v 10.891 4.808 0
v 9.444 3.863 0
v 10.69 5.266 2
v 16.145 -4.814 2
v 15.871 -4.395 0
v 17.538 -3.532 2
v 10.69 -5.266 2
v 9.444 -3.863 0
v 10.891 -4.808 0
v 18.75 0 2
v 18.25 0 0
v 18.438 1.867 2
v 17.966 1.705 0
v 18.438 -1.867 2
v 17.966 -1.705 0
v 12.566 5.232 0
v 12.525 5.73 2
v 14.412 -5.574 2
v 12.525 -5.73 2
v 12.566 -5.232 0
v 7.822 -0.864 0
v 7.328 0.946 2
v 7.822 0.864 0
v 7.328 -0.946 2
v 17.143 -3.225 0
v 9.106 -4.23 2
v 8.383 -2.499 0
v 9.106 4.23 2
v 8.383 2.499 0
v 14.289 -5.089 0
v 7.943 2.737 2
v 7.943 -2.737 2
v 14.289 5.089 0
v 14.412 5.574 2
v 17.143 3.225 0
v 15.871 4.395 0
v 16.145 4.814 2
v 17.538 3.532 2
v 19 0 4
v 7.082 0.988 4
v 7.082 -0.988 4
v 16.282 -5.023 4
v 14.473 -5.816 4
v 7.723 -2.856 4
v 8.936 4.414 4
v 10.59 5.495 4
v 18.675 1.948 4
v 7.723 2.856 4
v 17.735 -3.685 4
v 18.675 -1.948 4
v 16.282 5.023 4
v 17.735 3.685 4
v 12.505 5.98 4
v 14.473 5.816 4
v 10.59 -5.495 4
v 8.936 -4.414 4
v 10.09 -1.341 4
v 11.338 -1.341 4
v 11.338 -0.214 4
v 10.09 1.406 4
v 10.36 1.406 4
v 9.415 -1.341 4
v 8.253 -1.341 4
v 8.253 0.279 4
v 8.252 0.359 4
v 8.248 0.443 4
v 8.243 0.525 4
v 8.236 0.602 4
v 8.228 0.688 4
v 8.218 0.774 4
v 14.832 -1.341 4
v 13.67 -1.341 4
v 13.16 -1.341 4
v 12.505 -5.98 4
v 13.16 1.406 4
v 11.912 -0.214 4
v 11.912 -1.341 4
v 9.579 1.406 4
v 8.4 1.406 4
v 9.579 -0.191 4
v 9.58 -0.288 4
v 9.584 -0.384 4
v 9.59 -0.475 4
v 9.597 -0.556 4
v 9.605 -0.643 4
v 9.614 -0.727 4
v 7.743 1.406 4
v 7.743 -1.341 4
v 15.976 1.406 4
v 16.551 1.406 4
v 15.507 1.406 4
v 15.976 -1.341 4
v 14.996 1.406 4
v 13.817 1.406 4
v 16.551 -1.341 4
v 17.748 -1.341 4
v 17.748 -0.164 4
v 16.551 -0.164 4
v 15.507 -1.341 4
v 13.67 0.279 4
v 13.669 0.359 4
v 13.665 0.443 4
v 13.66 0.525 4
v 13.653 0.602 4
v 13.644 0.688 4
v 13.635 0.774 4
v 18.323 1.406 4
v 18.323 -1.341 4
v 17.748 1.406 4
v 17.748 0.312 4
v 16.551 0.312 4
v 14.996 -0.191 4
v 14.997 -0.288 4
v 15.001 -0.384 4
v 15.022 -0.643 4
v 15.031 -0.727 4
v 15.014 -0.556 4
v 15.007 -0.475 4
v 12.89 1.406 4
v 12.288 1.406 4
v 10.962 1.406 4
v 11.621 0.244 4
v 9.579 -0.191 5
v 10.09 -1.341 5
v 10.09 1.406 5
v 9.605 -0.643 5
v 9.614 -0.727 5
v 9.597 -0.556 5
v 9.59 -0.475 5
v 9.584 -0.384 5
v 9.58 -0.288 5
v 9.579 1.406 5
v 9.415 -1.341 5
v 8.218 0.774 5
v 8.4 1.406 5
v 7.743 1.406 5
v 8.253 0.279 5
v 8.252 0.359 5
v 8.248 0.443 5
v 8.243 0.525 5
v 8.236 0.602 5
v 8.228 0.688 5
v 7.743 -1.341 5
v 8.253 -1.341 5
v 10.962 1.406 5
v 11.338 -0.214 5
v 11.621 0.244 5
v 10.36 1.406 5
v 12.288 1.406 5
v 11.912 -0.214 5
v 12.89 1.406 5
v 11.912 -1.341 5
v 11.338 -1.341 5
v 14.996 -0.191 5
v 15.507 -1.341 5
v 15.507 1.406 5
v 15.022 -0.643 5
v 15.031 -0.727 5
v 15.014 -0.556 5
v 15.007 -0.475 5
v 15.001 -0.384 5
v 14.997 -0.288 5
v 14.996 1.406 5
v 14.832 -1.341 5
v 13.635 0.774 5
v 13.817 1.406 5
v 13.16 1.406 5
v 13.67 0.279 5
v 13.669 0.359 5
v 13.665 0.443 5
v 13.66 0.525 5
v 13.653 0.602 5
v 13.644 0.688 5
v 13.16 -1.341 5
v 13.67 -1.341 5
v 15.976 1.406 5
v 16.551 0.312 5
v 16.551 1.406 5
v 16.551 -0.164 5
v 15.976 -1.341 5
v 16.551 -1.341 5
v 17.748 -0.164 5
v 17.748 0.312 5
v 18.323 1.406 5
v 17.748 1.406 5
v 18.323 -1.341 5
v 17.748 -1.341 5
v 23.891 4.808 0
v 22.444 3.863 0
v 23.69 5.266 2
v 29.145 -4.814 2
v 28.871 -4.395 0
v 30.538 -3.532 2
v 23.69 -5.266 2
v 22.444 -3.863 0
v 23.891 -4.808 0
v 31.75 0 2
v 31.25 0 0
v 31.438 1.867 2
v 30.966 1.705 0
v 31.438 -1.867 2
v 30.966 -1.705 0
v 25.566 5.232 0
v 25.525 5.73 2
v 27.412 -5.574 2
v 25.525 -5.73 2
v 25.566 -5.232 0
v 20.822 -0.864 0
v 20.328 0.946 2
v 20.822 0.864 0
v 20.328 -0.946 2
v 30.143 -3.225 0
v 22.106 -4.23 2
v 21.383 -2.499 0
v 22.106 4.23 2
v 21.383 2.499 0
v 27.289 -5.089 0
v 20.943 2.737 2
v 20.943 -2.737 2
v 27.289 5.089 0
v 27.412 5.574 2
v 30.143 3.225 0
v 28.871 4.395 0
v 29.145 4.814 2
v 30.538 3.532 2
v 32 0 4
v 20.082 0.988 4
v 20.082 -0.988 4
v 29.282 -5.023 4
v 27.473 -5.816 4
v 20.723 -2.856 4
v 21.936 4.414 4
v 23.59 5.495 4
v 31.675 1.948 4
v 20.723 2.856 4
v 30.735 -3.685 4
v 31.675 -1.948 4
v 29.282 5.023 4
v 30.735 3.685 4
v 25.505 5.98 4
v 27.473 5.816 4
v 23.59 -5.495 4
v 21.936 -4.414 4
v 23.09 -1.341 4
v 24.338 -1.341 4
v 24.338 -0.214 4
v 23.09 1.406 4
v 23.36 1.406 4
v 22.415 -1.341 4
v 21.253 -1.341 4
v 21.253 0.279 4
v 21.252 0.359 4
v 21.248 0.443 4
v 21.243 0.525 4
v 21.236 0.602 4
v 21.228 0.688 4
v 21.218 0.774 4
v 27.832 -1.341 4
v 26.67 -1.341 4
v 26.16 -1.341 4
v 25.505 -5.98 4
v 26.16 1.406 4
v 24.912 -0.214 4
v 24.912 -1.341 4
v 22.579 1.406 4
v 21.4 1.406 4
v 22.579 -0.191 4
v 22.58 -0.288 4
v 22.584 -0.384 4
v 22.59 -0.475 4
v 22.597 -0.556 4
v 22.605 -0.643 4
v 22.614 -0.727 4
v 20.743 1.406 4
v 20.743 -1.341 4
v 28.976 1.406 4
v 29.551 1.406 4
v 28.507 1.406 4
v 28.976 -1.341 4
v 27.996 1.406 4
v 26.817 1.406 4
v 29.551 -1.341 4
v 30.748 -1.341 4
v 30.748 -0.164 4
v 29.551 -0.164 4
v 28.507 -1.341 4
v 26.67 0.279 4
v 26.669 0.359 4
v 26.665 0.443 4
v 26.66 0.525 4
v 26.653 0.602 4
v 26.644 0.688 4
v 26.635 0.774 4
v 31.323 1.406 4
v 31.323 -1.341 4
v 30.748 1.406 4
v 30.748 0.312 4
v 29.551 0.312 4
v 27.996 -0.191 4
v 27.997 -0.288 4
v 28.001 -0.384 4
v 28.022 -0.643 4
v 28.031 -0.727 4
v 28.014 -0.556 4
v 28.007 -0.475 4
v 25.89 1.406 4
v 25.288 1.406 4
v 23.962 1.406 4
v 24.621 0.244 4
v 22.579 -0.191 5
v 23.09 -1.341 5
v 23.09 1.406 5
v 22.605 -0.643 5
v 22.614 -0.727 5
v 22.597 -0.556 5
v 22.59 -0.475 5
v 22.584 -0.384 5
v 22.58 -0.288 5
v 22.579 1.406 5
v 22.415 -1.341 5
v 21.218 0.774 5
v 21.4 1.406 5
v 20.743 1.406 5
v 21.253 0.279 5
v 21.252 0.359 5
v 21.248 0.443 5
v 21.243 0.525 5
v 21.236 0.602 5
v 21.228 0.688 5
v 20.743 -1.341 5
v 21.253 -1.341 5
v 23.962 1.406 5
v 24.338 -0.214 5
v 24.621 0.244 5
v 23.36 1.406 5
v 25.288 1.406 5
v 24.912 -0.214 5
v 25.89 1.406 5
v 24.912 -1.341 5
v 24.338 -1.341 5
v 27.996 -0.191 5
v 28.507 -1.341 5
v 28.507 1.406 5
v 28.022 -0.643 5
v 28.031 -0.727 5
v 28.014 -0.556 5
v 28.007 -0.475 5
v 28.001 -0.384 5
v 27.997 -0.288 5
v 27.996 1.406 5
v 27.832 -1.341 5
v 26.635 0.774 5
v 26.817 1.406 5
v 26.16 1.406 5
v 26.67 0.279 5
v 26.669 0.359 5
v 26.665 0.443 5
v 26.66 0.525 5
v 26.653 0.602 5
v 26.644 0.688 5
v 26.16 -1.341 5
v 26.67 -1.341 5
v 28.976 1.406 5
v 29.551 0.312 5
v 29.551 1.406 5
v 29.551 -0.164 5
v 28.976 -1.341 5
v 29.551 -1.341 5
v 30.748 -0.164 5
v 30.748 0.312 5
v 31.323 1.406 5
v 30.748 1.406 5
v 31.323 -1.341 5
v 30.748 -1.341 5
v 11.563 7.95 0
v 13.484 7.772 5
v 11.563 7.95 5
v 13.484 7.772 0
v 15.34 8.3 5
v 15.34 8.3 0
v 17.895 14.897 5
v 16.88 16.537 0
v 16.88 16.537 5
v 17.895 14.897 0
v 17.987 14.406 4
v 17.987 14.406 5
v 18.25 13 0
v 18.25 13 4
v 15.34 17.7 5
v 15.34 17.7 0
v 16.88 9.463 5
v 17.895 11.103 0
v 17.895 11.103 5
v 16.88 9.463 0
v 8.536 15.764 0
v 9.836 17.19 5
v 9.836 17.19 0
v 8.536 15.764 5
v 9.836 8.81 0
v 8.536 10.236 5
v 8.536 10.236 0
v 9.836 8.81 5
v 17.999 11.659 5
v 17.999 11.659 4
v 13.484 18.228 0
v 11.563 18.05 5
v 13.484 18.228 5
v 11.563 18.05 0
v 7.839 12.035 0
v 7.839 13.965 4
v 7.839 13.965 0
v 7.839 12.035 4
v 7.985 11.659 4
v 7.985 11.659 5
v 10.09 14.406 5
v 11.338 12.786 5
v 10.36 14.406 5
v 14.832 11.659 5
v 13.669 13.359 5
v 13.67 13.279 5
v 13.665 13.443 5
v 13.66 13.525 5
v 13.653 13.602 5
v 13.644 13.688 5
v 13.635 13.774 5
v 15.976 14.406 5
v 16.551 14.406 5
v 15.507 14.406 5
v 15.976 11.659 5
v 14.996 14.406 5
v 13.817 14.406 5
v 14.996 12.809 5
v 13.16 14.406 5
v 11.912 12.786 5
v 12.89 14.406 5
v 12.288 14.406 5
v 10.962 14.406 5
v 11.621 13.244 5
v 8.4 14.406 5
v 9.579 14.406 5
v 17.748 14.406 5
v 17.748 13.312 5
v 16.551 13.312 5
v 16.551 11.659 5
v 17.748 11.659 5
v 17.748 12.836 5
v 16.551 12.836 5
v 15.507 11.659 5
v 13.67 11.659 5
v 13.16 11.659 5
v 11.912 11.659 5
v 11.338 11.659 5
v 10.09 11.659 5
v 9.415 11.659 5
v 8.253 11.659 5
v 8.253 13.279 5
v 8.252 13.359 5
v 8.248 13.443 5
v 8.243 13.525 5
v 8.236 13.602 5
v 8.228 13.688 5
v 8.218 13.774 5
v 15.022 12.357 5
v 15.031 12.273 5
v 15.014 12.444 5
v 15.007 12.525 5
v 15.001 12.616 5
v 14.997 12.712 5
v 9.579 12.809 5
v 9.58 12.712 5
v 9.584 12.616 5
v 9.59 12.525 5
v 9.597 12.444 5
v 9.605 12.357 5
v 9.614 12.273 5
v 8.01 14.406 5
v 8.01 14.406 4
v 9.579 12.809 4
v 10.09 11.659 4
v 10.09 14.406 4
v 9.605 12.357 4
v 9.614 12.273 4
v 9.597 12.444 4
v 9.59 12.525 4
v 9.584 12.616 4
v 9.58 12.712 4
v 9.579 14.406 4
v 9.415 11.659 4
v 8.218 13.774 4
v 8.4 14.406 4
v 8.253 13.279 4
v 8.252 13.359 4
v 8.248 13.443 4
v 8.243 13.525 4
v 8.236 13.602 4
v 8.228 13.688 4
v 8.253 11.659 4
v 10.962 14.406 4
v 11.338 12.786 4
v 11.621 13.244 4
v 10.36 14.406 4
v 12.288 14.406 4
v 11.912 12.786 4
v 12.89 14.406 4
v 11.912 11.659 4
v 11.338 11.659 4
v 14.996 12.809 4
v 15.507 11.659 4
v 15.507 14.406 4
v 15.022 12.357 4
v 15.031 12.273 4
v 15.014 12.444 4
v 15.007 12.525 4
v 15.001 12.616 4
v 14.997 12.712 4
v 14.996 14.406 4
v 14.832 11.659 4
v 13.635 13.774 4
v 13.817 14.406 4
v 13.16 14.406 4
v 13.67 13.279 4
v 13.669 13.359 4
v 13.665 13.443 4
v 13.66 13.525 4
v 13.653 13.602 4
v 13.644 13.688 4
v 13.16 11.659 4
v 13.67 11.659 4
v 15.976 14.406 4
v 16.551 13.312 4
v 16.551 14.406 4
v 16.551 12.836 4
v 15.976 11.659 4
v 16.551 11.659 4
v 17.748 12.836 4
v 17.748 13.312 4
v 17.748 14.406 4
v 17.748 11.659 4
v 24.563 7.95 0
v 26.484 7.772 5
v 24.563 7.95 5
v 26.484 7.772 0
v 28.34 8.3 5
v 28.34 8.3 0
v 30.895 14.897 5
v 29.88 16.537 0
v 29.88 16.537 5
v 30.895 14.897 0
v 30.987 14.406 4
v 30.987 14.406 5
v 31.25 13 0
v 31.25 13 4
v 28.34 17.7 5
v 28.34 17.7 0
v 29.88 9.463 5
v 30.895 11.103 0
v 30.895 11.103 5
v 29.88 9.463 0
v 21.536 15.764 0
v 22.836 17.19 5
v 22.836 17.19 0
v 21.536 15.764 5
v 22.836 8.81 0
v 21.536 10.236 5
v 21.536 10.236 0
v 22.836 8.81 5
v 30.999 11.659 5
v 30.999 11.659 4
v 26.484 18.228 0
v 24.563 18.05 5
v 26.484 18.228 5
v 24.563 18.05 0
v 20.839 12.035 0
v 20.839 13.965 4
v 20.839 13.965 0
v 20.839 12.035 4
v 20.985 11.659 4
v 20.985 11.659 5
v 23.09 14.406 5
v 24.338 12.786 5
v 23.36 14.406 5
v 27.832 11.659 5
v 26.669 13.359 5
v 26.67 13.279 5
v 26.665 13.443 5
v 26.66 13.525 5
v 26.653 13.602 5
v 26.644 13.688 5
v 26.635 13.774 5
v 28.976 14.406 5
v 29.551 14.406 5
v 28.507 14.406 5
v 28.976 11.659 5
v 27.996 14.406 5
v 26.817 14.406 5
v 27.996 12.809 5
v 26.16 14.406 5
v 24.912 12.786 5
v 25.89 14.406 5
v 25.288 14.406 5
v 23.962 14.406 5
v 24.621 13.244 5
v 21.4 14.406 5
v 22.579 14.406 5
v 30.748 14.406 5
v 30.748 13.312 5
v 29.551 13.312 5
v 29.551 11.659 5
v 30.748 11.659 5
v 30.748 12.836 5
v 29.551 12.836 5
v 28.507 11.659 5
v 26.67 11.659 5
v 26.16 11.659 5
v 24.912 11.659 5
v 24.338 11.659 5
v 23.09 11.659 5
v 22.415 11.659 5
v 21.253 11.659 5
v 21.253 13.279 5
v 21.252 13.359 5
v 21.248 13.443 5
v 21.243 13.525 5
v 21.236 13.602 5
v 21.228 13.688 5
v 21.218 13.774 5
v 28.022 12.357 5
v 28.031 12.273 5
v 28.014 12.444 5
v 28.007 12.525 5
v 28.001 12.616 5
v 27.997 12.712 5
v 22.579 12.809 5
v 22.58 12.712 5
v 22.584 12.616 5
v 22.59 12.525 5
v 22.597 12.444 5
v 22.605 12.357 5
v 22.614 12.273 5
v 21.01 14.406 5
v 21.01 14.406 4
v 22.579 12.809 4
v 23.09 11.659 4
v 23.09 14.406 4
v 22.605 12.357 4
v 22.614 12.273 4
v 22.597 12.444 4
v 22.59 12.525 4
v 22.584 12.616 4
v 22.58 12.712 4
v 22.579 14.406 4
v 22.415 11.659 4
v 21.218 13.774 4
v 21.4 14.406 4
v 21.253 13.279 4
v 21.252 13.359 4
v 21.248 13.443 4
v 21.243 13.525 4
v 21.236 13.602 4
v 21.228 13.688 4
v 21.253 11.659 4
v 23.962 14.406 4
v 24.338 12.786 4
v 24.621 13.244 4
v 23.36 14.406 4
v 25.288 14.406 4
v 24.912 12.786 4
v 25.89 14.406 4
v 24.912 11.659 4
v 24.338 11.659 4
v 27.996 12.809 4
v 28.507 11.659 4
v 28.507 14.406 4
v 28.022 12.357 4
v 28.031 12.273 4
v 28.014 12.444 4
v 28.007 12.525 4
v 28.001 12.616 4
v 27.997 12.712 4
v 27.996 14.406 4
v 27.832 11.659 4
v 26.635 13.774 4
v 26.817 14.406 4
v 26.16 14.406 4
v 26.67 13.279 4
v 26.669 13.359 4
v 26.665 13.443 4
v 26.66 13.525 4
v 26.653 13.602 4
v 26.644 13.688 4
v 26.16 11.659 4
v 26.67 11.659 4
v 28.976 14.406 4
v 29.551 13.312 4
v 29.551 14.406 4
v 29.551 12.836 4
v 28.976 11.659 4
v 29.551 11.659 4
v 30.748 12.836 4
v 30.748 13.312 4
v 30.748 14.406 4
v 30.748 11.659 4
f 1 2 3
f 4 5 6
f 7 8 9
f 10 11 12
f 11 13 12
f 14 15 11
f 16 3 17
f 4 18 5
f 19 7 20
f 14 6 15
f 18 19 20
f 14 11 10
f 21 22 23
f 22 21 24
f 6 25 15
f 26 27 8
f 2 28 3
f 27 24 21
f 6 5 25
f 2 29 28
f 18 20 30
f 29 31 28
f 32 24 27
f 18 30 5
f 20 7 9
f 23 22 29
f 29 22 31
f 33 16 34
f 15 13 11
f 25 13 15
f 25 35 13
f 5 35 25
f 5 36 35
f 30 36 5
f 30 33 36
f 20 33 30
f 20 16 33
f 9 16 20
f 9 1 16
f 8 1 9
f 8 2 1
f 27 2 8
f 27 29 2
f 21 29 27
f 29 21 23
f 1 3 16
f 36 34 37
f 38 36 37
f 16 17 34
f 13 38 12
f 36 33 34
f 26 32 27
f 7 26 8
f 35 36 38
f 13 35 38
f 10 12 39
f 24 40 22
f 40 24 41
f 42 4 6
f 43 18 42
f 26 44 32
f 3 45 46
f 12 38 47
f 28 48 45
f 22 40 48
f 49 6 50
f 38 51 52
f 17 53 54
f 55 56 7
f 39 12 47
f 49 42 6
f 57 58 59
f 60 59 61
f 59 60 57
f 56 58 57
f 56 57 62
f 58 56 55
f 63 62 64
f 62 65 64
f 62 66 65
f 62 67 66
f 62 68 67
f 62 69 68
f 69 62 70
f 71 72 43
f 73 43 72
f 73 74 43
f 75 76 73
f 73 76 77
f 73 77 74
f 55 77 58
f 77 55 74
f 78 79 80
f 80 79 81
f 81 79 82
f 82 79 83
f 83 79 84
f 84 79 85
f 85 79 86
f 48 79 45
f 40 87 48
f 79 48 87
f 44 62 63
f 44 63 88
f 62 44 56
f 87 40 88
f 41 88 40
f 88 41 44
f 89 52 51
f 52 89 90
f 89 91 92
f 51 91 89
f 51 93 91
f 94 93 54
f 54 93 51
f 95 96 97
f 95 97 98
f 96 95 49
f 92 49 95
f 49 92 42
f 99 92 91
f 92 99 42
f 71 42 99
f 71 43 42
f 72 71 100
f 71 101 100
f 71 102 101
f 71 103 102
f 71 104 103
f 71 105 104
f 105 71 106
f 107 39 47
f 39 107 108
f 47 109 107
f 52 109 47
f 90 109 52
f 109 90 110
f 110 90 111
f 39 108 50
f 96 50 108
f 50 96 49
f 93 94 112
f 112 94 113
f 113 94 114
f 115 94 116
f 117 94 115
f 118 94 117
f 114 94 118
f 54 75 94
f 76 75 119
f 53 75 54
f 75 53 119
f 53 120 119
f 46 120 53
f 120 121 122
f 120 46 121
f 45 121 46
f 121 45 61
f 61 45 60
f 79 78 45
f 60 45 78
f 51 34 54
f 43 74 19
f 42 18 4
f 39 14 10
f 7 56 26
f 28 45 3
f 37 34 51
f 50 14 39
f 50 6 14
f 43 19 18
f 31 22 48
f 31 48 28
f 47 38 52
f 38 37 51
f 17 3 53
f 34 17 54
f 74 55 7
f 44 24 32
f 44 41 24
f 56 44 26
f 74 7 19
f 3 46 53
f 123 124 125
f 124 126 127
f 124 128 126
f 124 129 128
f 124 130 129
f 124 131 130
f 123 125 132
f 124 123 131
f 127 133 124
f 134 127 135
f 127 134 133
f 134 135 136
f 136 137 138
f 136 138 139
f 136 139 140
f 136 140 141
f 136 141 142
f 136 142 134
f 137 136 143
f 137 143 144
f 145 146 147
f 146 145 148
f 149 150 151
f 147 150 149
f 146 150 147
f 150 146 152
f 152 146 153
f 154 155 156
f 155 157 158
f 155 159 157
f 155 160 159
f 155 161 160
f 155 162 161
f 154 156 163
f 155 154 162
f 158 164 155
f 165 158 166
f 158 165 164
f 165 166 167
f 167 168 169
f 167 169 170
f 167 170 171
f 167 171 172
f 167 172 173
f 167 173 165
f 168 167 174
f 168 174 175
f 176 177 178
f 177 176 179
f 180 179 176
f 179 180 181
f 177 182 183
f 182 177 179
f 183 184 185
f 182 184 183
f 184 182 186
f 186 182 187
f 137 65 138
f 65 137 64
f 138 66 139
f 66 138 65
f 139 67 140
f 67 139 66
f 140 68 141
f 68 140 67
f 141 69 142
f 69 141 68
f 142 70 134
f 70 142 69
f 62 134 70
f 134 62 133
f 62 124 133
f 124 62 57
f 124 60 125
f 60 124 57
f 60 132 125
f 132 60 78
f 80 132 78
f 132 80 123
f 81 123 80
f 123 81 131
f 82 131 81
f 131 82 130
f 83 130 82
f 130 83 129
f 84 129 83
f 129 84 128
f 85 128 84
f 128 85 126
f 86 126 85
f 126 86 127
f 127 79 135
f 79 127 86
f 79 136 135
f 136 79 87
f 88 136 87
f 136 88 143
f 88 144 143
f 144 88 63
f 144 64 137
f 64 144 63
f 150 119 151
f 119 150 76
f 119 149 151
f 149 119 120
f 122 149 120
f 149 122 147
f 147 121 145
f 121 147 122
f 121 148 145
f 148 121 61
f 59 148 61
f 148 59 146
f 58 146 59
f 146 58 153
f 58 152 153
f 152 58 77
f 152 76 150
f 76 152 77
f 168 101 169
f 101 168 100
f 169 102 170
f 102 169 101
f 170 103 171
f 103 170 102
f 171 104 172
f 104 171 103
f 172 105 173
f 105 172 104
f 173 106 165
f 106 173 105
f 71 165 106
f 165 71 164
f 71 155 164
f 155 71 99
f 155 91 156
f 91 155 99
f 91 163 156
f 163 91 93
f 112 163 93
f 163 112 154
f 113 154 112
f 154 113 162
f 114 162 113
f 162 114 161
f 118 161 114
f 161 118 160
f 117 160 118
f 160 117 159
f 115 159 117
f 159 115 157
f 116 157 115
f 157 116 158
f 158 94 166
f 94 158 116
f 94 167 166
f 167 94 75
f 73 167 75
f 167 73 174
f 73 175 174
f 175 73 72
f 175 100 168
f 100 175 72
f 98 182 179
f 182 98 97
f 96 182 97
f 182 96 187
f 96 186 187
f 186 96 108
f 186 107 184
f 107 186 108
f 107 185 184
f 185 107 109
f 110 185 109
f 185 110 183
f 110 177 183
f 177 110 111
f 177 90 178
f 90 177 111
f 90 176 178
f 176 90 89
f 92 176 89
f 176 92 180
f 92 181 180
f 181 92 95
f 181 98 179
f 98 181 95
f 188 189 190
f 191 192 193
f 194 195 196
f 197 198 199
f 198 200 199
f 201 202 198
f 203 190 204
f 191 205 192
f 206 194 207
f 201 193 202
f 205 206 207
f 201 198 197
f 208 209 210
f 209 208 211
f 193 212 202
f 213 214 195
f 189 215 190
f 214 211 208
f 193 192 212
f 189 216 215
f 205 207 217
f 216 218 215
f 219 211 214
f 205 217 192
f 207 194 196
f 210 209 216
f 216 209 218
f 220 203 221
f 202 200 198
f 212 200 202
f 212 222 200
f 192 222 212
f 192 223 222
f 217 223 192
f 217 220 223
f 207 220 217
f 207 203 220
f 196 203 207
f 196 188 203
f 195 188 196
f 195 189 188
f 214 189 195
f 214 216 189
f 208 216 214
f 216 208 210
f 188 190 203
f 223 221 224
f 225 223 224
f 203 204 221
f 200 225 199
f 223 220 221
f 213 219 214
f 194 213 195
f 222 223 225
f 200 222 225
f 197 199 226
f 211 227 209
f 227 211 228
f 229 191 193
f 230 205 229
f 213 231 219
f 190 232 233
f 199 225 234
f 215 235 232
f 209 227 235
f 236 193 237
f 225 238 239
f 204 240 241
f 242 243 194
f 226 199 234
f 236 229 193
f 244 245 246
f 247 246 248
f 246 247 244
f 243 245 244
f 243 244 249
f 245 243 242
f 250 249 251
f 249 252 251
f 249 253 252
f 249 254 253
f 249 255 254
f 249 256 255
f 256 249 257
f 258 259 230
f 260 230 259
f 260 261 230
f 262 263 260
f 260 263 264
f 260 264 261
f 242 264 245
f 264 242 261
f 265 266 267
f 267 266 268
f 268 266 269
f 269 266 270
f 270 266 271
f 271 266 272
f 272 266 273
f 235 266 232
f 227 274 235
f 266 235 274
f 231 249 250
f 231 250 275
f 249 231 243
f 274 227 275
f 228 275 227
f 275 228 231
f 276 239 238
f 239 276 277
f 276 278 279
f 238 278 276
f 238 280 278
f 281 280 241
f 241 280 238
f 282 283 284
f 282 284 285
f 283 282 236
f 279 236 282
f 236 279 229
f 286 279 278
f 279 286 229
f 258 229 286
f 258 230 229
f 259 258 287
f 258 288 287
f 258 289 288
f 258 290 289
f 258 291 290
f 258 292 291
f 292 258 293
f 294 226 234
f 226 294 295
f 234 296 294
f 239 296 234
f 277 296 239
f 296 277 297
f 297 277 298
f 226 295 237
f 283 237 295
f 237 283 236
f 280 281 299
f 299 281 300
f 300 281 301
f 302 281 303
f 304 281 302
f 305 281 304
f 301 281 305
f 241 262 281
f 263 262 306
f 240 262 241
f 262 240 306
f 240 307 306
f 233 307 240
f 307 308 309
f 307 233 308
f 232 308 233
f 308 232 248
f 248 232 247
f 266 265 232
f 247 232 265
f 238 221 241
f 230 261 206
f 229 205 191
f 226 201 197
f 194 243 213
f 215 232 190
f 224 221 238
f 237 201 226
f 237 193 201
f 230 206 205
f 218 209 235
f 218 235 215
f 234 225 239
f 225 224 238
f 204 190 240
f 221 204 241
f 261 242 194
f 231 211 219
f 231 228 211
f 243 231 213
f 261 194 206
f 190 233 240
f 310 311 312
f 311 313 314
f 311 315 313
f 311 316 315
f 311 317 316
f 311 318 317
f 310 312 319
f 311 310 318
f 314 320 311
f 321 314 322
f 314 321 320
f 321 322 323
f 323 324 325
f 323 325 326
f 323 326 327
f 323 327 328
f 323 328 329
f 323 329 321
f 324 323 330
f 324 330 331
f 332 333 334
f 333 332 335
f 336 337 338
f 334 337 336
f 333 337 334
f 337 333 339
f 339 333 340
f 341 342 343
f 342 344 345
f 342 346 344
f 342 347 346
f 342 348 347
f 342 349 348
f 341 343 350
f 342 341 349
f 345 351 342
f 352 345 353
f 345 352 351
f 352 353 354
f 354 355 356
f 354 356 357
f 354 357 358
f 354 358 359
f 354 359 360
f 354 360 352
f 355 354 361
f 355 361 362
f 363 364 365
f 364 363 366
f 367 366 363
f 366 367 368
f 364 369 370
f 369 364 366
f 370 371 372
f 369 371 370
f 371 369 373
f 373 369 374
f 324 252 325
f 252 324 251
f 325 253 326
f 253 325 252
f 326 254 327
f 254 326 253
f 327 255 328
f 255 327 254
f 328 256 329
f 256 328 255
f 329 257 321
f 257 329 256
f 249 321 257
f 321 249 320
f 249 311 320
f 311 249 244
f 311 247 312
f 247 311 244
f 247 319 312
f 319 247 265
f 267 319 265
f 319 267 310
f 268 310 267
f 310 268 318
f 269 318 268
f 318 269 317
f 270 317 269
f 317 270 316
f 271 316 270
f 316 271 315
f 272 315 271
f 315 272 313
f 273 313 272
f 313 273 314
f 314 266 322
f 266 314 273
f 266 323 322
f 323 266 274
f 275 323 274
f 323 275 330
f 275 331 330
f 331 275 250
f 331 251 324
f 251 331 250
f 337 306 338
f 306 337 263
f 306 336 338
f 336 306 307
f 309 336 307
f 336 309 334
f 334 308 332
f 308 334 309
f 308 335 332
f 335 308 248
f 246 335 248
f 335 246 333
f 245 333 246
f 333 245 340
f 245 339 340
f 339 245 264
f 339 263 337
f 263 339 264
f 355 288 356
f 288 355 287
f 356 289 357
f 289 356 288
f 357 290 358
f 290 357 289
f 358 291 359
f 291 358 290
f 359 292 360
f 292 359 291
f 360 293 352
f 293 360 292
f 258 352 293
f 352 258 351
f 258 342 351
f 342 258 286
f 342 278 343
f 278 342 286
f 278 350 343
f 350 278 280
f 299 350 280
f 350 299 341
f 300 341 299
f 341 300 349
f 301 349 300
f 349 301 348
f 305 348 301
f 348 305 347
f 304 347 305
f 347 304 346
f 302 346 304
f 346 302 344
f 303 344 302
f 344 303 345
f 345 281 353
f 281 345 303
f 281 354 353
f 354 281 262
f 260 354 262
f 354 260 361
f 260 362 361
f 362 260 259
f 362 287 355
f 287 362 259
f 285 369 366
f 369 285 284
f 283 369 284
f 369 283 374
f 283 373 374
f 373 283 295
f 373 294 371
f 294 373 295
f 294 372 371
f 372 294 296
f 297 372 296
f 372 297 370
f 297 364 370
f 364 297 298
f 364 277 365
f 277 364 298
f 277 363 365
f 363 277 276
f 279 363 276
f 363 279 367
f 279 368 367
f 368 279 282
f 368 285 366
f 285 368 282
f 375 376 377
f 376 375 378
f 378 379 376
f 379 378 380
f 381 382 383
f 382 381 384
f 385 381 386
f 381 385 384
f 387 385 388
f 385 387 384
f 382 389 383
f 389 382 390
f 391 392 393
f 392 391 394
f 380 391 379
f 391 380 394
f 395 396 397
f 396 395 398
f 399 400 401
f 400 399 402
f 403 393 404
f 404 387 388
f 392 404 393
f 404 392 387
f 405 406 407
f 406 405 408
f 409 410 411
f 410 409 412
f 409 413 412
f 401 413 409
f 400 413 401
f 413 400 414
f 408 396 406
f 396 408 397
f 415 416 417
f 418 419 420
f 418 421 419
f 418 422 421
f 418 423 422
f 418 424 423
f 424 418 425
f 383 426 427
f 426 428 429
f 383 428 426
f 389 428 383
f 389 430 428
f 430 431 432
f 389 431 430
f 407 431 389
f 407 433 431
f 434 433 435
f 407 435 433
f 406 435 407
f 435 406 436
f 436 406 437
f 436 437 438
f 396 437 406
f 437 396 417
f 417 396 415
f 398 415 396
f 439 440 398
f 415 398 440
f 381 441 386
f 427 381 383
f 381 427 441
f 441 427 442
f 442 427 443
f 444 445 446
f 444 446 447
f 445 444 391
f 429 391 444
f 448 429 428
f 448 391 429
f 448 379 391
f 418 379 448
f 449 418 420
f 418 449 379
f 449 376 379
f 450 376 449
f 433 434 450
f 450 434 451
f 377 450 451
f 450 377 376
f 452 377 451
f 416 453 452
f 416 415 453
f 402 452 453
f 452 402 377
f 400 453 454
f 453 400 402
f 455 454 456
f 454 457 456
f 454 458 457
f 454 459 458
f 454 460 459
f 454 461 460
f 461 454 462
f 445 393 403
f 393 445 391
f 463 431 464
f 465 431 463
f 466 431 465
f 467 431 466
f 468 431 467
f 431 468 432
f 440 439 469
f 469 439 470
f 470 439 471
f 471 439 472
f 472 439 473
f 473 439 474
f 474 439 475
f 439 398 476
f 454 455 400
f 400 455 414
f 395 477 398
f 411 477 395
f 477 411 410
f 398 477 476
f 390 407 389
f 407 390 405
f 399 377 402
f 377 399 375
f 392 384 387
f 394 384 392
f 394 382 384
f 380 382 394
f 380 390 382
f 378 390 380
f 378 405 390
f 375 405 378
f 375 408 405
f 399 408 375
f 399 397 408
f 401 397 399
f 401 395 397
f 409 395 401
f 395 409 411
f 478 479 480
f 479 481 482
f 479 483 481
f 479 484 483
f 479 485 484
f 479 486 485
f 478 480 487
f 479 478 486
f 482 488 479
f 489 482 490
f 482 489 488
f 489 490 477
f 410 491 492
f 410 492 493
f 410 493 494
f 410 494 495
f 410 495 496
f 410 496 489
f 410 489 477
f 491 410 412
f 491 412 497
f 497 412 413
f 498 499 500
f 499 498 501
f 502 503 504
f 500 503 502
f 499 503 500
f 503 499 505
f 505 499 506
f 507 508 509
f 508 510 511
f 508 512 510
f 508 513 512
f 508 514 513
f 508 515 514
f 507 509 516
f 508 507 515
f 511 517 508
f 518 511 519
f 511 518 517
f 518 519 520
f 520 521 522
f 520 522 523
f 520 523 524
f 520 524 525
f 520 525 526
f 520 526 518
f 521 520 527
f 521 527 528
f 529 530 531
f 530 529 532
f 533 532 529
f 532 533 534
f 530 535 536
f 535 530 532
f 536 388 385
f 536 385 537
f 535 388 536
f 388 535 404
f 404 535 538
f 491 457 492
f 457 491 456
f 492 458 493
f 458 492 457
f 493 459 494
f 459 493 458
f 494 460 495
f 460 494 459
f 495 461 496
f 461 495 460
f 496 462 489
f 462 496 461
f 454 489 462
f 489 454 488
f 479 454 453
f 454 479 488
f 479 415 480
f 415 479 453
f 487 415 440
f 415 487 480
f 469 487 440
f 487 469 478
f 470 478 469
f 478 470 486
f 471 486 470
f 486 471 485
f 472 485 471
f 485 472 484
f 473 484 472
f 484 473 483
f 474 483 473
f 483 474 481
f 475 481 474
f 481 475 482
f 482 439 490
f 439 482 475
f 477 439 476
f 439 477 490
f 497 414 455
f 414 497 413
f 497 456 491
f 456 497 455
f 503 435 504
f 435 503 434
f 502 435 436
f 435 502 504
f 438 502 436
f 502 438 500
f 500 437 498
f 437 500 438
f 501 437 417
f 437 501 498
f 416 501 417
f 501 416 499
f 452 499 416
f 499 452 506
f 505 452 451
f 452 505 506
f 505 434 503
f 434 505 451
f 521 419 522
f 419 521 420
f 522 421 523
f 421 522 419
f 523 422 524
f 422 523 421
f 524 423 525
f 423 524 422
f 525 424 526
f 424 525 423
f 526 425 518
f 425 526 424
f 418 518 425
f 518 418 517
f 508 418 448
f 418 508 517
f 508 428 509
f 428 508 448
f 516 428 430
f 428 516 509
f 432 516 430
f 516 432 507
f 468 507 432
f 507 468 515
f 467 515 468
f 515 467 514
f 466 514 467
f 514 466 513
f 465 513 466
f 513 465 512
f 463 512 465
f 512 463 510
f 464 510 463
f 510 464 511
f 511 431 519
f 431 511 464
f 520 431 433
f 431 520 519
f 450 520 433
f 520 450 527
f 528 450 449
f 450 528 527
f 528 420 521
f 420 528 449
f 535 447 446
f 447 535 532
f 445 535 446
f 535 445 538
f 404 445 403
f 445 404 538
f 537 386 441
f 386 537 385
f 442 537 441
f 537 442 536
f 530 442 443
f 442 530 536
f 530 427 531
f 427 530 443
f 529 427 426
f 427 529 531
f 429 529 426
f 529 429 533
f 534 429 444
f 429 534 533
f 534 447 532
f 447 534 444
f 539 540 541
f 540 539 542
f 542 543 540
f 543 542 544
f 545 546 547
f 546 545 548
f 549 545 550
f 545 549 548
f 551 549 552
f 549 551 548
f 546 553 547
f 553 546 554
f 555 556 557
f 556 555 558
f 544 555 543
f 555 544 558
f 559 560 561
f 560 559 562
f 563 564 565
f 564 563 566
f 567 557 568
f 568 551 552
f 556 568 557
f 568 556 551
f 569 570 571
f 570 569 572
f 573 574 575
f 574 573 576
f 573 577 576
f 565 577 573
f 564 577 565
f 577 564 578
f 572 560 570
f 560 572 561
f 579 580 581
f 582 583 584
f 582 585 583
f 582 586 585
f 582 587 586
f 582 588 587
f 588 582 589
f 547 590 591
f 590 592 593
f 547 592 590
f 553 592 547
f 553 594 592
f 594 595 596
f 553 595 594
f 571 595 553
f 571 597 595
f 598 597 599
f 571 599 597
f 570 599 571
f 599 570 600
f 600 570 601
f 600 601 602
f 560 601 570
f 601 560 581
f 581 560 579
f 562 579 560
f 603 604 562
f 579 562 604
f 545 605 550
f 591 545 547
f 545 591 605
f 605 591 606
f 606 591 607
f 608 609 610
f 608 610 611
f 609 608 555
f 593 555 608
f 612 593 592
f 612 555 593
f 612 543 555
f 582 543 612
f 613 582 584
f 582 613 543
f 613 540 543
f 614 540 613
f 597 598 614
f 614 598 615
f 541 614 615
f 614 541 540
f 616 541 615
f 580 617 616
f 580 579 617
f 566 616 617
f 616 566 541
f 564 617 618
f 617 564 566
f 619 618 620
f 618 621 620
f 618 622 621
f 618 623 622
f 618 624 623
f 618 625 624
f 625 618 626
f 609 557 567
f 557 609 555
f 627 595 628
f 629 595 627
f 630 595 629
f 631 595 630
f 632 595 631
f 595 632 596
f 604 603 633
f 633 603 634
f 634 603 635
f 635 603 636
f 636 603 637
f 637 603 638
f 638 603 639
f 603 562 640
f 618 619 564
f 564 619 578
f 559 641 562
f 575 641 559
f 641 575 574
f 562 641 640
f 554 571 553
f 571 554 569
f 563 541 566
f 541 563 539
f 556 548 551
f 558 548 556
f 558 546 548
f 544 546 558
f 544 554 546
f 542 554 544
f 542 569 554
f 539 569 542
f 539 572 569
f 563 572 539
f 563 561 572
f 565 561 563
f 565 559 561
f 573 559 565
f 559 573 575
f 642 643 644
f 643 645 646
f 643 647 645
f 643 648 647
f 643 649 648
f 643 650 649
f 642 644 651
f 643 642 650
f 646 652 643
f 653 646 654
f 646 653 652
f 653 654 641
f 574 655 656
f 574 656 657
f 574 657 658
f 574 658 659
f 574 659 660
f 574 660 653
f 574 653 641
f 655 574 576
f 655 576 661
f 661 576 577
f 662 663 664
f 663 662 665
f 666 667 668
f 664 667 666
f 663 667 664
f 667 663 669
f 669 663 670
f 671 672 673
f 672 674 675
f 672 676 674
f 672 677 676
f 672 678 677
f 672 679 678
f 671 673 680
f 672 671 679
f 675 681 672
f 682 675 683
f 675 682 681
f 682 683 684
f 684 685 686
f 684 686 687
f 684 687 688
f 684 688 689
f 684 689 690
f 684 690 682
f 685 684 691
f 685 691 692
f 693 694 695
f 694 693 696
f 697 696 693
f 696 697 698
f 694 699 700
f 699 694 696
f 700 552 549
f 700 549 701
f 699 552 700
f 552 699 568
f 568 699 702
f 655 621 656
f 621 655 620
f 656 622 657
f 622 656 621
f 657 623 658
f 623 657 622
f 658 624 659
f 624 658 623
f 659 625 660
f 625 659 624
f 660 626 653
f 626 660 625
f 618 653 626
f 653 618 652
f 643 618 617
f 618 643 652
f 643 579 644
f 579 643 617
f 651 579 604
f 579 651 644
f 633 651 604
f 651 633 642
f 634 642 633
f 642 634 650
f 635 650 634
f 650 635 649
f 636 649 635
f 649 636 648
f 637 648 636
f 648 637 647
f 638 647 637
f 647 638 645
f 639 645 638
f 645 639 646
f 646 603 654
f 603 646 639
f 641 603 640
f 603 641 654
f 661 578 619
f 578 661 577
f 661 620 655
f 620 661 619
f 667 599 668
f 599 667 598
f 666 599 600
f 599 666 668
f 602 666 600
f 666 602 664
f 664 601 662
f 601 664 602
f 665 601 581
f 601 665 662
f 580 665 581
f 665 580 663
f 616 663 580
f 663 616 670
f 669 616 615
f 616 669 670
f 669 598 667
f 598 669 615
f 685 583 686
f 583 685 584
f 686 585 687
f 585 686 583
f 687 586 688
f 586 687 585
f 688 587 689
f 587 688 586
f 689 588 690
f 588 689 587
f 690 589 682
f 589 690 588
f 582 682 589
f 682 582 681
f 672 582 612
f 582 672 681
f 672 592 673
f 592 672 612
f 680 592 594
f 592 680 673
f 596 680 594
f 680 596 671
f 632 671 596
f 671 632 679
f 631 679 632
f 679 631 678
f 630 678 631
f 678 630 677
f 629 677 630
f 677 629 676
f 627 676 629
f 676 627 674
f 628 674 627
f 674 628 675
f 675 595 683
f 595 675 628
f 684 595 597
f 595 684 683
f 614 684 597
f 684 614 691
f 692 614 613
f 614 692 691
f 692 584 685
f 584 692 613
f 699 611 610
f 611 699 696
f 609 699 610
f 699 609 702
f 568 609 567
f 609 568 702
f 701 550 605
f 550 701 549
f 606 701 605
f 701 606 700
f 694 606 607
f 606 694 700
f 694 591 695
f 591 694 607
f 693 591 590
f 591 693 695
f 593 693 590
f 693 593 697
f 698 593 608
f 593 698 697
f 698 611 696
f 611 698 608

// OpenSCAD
include <../../Scripts/18xx tiles basic functions.scad>
make_token_array("NYNH",2,2);
